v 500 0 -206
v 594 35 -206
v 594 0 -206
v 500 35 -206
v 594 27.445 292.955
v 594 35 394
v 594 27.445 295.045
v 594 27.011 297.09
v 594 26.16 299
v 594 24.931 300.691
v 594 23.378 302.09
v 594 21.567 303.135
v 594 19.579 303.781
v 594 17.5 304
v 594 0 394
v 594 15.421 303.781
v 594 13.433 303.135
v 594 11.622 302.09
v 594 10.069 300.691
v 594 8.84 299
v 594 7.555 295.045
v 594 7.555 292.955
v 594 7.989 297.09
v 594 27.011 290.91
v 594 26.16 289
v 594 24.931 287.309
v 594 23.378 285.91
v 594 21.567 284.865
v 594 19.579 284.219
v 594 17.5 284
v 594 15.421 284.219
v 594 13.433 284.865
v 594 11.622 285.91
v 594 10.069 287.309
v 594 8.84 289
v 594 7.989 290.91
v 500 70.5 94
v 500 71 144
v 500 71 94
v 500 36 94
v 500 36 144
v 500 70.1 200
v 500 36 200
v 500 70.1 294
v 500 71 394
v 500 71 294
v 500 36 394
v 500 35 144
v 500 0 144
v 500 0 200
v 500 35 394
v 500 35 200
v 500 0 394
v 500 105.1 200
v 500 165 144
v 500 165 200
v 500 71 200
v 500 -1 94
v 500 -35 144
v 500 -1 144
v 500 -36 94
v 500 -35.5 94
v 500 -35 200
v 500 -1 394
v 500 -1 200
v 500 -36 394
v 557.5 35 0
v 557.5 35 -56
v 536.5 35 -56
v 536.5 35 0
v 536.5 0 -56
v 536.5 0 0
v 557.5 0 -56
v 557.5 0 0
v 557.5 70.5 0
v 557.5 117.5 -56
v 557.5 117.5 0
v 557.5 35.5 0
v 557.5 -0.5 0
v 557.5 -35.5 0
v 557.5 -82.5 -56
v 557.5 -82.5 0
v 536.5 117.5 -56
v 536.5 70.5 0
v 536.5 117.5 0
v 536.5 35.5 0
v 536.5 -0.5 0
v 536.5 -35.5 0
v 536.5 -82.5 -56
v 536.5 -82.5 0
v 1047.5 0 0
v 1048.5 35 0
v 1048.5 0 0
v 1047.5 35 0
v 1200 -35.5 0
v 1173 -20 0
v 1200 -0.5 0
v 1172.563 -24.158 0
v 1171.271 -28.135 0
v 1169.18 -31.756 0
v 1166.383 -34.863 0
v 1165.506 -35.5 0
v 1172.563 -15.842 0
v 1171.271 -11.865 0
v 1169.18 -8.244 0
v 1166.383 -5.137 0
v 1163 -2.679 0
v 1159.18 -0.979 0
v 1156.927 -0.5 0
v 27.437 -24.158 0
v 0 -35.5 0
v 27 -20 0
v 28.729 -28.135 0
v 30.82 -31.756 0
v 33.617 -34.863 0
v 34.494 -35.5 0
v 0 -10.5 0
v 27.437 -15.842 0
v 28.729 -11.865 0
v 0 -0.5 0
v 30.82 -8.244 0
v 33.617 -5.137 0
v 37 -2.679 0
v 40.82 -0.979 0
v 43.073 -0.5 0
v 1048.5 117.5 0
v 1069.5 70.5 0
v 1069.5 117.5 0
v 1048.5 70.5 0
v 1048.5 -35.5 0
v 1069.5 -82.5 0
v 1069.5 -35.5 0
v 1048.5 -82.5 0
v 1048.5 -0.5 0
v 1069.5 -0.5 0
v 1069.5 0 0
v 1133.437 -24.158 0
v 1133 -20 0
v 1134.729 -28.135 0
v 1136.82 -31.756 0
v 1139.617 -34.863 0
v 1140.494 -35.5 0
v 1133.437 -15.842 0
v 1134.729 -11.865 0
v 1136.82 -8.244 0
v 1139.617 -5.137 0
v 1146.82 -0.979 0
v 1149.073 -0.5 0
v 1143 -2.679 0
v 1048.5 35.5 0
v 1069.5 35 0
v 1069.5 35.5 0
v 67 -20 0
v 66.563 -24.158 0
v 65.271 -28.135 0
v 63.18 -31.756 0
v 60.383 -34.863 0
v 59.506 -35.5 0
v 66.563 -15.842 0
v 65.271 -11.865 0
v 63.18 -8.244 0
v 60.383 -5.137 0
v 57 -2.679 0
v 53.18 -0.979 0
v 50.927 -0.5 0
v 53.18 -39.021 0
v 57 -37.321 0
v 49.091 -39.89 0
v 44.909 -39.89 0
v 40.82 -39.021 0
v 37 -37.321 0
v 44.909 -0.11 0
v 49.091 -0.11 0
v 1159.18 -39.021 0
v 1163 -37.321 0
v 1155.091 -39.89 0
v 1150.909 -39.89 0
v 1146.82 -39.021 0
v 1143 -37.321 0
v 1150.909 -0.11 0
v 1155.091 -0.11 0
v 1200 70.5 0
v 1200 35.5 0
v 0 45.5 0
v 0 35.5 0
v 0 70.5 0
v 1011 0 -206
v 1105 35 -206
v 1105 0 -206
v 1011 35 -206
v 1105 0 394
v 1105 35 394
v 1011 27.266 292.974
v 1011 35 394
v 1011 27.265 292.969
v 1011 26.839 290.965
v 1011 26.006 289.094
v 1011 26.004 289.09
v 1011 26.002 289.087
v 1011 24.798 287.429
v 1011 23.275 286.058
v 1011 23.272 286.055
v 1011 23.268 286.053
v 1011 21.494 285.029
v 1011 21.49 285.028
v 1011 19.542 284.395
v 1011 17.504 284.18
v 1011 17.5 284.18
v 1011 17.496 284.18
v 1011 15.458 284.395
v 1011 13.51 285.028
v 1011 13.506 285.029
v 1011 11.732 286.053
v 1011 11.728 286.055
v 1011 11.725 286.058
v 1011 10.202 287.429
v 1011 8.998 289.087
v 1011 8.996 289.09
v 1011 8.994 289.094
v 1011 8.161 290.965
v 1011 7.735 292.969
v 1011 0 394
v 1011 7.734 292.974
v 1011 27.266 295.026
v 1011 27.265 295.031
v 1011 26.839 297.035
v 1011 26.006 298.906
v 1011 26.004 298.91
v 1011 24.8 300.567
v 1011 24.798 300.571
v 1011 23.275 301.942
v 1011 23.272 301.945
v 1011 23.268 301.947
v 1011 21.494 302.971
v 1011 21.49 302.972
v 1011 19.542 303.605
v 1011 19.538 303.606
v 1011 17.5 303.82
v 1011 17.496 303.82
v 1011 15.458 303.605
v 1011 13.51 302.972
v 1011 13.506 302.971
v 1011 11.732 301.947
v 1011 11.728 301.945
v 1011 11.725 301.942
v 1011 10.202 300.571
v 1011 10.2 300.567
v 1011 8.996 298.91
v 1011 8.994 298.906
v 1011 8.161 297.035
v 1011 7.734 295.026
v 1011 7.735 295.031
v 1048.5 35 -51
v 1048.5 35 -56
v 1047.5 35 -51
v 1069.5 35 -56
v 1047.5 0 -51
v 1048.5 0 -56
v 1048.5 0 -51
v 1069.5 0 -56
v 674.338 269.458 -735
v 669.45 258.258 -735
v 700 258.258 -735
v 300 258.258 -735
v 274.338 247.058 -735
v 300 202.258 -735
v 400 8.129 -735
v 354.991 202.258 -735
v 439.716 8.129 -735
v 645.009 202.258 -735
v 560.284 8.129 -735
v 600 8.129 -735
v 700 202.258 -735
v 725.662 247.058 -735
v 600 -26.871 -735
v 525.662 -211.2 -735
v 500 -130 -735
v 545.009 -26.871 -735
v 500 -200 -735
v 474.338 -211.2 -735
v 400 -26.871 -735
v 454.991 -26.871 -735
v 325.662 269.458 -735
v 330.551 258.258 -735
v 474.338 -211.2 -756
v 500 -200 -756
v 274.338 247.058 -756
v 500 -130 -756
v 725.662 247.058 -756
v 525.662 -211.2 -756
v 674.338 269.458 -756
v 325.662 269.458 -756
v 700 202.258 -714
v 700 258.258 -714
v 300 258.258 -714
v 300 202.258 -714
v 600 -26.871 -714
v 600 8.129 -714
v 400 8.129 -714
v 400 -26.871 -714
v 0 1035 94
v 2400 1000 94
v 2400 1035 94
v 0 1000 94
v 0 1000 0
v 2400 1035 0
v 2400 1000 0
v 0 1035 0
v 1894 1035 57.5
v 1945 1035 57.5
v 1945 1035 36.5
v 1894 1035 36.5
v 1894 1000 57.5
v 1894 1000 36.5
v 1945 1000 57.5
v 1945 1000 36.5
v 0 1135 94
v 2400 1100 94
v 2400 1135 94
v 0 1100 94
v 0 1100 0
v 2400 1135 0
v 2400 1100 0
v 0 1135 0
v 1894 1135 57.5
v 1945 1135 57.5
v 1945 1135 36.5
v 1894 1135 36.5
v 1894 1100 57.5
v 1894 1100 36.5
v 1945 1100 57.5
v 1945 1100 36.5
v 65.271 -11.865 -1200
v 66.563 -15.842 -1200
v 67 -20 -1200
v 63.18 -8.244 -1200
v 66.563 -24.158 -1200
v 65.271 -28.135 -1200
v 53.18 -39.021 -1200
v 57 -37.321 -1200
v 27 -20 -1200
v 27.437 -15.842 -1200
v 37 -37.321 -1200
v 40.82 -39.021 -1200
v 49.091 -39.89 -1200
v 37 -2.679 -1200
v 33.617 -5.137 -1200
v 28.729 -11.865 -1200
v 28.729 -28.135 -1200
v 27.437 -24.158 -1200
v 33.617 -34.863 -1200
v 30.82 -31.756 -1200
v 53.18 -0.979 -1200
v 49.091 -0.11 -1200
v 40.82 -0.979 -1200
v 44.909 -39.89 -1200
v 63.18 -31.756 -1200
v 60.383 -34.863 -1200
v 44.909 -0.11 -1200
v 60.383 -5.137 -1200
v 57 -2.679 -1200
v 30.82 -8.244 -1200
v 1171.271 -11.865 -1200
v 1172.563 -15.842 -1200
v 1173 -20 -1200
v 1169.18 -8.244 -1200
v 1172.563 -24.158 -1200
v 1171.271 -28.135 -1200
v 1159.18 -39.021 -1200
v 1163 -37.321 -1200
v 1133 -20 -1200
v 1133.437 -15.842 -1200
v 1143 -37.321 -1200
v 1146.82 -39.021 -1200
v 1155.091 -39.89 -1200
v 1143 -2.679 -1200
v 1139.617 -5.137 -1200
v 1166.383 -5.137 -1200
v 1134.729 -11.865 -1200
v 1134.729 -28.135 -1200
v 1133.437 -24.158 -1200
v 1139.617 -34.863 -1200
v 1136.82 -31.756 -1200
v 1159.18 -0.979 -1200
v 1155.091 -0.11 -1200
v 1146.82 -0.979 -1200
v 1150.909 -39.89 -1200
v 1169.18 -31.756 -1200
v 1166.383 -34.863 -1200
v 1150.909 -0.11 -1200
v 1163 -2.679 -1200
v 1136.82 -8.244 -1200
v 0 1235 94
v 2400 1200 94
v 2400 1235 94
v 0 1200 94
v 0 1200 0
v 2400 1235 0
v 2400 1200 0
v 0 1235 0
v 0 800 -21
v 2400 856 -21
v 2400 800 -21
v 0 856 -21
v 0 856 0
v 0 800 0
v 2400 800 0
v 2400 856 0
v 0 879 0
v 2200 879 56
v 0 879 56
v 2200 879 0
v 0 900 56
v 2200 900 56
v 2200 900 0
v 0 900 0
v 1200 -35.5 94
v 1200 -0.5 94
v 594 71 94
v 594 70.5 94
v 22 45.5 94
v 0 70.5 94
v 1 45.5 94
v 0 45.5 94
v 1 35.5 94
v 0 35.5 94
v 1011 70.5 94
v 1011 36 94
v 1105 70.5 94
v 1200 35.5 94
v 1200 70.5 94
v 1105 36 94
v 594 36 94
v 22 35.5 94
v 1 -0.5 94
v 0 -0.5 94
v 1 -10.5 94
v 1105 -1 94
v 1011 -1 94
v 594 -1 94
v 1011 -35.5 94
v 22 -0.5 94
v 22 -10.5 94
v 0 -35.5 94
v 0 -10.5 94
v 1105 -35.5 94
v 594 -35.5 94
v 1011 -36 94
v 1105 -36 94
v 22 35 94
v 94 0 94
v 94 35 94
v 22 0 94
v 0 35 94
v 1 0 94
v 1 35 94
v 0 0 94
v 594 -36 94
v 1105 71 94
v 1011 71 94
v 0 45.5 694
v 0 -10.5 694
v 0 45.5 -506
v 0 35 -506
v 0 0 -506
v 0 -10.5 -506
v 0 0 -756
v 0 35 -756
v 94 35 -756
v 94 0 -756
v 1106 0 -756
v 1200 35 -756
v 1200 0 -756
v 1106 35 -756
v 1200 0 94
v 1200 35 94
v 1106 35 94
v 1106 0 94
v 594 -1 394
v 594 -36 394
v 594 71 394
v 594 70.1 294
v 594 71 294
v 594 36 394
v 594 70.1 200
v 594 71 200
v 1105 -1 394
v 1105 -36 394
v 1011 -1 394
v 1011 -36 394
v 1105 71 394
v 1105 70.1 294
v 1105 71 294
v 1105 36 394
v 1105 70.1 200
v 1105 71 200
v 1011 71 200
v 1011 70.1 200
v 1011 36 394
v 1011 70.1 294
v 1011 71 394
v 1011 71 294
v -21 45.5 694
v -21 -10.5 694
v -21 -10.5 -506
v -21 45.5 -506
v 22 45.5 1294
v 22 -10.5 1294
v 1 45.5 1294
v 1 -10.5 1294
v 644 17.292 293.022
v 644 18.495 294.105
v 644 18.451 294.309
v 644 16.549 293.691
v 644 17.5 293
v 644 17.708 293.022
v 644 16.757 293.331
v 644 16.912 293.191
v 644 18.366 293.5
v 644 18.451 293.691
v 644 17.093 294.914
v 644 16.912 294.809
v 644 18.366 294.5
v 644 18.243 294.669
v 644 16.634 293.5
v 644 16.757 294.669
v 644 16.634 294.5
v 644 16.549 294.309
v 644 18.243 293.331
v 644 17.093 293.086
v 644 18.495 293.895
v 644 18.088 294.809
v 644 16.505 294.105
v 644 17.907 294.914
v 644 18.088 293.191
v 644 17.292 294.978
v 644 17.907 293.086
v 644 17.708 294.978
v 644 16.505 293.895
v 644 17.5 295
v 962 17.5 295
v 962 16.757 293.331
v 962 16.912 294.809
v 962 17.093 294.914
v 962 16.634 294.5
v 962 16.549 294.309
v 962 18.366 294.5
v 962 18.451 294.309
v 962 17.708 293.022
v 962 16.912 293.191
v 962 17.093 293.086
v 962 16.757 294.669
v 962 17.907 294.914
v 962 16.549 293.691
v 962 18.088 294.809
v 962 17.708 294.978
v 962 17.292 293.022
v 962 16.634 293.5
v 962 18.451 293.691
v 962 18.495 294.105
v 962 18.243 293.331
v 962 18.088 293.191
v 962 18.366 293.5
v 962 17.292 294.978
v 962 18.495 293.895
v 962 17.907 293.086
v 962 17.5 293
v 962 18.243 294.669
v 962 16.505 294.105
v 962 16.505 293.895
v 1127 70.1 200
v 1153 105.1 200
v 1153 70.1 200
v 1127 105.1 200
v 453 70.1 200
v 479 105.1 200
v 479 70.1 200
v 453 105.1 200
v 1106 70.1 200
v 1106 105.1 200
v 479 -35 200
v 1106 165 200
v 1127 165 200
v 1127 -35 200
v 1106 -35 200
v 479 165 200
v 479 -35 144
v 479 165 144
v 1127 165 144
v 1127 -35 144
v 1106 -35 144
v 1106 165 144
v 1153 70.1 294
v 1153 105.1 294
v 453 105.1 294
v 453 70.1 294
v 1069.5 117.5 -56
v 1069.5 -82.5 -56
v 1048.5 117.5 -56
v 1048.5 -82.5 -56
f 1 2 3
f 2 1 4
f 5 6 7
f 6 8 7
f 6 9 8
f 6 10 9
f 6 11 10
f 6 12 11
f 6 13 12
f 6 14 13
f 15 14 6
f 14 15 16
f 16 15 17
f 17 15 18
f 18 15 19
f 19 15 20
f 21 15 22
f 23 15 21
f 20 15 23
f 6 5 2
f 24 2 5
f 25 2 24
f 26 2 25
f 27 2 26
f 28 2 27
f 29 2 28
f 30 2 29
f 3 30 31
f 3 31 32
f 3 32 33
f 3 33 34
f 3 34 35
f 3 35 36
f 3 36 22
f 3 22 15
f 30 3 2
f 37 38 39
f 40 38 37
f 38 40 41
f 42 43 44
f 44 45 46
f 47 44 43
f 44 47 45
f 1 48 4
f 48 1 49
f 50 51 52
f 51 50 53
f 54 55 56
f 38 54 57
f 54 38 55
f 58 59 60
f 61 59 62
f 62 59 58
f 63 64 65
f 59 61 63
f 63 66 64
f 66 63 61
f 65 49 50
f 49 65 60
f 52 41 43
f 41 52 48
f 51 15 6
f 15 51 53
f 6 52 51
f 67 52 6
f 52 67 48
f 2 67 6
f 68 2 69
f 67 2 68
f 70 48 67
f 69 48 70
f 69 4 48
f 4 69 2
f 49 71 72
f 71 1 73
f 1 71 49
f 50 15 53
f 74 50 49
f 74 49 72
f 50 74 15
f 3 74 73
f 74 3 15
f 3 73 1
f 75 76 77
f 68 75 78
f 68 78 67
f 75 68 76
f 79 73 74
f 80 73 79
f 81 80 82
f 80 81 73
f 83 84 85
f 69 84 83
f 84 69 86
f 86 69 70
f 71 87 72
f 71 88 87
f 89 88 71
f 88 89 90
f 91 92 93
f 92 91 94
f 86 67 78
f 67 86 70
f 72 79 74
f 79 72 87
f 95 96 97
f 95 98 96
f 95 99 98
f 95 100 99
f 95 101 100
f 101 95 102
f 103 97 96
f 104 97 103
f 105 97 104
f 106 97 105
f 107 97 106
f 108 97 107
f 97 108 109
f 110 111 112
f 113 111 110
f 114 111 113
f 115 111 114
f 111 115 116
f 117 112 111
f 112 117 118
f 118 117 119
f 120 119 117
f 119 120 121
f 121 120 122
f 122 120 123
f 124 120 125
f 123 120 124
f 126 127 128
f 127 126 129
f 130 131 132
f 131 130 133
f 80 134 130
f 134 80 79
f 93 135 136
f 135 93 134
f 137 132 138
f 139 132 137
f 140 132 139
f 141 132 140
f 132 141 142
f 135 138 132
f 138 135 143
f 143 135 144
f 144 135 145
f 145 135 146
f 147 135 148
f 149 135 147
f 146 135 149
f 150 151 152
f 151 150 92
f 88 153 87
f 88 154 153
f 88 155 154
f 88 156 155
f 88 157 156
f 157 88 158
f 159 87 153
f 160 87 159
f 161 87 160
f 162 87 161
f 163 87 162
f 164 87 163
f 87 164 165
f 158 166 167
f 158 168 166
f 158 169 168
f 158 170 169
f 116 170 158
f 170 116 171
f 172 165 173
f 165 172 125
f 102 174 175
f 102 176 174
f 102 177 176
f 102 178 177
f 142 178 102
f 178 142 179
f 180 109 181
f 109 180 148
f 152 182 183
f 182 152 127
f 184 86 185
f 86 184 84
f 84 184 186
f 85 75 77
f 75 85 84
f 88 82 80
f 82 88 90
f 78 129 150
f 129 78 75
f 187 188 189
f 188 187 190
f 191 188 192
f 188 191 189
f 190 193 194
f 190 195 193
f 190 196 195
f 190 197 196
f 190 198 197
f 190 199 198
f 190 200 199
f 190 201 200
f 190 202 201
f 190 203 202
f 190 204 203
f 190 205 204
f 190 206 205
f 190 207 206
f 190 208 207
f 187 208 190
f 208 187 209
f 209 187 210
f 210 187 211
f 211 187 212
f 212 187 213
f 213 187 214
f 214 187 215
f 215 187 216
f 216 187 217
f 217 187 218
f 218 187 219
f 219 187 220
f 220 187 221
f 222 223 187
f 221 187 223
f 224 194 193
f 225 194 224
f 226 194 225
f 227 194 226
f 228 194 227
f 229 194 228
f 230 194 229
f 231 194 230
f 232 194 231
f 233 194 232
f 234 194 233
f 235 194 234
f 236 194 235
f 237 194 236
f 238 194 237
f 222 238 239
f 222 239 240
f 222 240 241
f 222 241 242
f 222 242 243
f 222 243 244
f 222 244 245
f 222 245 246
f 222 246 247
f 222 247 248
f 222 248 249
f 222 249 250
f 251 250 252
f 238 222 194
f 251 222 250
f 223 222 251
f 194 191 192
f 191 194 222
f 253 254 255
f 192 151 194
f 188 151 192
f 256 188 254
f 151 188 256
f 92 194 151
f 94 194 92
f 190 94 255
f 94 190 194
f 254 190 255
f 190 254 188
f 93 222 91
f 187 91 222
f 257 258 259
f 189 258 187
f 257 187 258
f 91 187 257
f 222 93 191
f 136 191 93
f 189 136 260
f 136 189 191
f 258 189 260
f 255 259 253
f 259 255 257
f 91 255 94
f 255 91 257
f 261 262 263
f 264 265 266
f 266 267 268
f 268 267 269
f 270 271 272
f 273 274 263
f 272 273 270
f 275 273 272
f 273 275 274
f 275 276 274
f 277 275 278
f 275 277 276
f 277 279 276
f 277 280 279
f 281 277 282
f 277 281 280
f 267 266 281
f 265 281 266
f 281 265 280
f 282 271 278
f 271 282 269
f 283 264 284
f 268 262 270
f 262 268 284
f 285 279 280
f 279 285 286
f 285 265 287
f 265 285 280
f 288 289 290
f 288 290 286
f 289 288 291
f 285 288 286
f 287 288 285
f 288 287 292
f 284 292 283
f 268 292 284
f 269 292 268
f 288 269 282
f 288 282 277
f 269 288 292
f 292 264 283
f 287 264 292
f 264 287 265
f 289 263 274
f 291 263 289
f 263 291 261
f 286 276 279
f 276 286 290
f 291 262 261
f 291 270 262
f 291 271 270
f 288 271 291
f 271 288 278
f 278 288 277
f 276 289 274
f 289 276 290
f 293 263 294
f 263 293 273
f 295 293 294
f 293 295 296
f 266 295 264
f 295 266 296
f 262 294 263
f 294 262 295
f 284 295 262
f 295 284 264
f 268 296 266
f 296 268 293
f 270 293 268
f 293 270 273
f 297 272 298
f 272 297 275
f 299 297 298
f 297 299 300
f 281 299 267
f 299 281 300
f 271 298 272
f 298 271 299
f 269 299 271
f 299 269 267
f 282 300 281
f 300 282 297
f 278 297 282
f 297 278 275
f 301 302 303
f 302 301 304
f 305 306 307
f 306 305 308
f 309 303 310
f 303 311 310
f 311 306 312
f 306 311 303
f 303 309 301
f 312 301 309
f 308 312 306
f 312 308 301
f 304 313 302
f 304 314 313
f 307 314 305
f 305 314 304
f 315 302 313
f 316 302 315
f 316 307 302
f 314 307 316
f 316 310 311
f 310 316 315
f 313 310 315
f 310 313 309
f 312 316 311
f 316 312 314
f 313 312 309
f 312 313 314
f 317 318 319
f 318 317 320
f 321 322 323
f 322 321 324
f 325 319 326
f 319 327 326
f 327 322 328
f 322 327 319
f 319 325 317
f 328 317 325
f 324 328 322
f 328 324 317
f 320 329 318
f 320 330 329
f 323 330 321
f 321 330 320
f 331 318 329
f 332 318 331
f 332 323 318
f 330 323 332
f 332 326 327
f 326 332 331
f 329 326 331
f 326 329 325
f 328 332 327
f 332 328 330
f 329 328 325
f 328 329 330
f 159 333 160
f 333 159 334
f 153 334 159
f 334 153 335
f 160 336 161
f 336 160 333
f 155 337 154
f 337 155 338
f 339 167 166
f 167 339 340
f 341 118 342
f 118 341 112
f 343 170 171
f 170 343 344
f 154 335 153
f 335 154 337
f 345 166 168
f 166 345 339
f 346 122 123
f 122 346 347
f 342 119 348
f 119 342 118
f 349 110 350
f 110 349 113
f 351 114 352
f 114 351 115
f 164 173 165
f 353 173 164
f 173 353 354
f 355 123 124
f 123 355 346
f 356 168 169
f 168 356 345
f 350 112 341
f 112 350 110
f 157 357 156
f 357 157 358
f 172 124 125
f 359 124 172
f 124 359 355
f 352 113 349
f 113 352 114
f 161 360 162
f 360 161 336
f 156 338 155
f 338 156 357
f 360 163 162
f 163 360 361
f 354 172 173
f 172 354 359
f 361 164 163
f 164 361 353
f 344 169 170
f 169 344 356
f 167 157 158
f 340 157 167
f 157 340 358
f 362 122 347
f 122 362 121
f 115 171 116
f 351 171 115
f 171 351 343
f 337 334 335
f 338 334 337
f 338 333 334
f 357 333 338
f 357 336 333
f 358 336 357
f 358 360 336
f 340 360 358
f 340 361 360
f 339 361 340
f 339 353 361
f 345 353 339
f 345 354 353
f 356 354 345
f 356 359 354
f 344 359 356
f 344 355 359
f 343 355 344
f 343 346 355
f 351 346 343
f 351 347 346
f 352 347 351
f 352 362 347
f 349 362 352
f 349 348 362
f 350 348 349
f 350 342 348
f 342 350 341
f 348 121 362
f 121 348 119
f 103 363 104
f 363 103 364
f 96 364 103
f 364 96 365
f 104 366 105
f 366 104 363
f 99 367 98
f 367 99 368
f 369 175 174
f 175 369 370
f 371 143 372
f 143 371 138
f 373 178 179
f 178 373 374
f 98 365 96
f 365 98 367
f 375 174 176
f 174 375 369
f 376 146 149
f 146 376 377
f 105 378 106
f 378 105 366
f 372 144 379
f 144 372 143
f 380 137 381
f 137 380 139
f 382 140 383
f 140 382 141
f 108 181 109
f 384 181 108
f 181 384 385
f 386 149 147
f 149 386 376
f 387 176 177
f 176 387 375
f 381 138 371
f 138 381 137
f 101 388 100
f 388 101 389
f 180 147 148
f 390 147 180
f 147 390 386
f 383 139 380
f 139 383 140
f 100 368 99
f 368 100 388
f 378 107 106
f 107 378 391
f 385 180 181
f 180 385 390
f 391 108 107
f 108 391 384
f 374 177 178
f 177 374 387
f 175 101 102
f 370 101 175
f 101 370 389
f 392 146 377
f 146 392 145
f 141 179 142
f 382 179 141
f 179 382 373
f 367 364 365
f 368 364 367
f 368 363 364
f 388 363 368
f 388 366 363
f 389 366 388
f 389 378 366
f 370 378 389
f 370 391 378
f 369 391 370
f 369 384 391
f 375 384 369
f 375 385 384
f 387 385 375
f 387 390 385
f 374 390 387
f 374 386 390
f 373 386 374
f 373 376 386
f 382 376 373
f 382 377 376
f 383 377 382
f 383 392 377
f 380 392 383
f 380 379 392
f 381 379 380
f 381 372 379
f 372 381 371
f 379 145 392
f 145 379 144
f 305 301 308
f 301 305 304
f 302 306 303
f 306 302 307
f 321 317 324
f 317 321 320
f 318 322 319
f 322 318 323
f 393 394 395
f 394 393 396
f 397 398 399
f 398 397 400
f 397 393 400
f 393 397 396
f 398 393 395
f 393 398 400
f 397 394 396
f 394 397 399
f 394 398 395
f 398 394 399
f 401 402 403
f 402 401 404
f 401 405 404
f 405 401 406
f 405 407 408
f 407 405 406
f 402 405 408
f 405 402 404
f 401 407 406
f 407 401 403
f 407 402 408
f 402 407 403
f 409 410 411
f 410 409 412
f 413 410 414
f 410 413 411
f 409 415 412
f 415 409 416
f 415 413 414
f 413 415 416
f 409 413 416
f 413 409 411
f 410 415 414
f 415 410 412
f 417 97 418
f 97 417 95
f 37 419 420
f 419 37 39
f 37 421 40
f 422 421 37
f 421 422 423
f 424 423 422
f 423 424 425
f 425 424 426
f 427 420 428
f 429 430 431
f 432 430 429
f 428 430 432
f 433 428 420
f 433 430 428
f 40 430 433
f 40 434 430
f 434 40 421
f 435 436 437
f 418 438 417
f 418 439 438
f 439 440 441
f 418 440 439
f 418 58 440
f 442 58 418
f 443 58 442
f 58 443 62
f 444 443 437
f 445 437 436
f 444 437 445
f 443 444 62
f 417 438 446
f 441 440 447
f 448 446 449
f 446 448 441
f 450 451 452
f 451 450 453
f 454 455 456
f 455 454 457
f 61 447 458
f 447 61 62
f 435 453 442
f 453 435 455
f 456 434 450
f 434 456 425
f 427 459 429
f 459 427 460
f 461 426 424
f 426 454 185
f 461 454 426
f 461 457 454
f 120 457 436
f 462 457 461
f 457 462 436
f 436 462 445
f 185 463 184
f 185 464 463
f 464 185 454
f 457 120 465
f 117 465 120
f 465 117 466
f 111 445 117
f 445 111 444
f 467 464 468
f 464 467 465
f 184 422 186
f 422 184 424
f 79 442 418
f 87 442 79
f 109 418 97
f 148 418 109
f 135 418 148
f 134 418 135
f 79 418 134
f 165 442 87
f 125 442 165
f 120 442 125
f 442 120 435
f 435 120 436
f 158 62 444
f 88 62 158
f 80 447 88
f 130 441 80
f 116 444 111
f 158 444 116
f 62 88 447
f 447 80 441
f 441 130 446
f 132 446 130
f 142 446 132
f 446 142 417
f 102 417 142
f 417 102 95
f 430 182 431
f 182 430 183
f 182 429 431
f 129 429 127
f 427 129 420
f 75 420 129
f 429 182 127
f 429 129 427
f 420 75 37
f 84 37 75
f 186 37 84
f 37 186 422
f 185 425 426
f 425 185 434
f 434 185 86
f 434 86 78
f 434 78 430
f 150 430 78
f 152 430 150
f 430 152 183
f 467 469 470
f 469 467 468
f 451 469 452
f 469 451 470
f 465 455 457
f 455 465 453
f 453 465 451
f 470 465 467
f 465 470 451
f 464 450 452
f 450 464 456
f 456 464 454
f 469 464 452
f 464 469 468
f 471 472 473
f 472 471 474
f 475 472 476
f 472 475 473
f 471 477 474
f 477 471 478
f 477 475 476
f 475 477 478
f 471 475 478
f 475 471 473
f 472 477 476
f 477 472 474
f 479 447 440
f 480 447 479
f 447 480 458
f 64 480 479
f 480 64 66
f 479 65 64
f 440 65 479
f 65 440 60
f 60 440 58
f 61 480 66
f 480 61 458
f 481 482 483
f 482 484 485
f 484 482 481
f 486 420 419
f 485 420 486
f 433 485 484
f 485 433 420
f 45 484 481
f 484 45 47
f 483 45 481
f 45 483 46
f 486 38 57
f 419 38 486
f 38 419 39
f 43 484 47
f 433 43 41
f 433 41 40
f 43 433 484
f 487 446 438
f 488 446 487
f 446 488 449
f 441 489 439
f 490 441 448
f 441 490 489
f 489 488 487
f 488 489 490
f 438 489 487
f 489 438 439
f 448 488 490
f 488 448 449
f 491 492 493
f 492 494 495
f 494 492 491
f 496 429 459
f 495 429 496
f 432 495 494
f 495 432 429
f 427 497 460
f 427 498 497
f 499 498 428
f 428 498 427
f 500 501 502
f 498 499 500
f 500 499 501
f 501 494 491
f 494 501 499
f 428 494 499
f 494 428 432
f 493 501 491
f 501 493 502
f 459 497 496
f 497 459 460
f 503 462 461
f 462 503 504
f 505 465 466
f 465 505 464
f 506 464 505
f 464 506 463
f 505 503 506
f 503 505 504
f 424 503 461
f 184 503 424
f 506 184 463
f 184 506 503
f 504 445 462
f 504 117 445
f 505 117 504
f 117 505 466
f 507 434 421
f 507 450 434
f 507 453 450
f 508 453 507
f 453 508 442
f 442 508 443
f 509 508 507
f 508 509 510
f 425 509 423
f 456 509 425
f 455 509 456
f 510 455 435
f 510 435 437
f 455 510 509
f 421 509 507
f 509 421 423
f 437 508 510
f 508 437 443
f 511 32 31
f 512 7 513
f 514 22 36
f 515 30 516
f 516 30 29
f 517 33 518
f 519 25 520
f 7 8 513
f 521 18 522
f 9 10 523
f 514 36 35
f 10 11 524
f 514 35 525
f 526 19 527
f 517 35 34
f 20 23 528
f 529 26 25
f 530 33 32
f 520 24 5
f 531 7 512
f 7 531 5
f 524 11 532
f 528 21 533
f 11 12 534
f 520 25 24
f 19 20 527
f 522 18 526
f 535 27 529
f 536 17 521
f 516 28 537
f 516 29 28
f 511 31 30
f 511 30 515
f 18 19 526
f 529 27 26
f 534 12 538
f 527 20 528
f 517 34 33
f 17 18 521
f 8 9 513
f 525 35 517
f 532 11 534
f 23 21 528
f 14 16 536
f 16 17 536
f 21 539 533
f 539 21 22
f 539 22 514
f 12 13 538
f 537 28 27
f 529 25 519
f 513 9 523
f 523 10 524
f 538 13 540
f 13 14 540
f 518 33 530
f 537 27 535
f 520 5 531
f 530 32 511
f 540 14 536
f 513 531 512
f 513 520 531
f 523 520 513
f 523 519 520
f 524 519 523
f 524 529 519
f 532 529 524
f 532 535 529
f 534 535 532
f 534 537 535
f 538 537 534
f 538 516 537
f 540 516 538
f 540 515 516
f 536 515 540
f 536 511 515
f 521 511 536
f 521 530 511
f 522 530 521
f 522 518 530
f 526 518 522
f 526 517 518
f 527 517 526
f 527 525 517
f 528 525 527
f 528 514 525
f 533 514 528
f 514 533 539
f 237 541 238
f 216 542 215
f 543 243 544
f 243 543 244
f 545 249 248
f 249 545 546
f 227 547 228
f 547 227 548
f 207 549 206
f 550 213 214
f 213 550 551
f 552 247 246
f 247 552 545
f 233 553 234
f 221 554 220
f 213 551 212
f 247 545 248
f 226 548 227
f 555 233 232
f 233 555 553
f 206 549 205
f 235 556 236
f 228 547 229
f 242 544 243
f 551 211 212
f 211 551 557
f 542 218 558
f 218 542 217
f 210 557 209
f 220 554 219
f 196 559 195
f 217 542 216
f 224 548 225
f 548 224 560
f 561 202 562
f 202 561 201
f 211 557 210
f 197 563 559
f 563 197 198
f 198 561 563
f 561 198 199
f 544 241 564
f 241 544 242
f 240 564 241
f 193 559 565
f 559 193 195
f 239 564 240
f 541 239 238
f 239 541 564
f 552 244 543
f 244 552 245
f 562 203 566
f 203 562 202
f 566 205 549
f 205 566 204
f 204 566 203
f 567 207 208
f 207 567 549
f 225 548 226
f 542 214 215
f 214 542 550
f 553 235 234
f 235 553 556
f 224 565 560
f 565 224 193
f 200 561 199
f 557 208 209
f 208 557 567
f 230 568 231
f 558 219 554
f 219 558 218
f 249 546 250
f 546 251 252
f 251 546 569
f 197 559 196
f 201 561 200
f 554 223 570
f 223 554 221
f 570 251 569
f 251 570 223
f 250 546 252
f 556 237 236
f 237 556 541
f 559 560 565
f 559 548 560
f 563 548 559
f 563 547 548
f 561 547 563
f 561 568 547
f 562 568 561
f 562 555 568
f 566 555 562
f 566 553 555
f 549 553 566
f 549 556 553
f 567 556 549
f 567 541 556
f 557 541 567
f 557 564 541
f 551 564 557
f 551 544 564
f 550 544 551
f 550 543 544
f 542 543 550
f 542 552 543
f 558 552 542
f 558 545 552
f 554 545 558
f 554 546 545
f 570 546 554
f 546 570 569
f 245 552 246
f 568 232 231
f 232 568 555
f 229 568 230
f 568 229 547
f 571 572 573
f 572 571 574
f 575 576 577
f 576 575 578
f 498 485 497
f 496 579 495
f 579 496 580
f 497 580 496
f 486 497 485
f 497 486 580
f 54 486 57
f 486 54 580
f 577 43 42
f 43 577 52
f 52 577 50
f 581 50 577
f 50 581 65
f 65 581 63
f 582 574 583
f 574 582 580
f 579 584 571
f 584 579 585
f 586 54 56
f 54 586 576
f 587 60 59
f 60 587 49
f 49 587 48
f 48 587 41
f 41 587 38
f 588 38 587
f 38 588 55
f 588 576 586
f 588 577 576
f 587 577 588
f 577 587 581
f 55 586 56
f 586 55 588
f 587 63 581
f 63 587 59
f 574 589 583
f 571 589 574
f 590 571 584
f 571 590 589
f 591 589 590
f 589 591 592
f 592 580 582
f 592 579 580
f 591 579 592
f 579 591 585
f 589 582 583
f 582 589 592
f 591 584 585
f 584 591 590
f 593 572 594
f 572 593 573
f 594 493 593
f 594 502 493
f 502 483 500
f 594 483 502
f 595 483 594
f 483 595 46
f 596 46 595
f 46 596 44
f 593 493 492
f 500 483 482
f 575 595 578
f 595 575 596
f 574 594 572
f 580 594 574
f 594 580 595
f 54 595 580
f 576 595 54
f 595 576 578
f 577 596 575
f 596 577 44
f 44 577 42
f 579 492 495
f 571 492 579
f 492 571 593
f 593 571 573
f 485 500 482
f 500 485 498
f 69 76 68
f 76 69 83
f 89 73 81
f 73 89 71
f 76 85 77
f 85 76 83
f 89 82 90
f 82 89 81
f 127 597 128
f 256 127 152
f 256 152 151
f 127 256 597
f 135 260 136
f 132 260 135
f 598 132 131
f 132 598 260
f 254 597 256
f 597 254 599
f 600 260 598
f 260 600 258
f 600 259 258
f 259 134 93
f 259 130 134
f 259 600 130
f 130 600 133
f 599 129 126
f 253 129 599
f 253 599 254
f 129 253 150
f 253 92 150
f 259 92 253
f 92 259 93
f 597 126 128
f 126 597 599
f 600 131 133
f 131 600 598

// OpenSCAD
/******************************************************************************!
 * \file tour-a-perche.scad
 * \author Sebastien Beaugrand
 * \sa http://beaugrand.chez.com/
 * \copyright CeCILL 2.1 Free Software license
 ******************************************************************************/
export = false;
hc = 1050;  // Hauteur coude
L = 1200;   // Longueur gros tasseau
P = 94;     // Profondeur gros tasseau
E = 35;     // Epaisseur gros tasseau
l = 1200;   // Longueur tasseau
p = 56;     // Profondeur tasseau
e = 21;     // Epaisseur tasseau
lp = 300;   // Longueur parement
lt = 300;   // Longueur tenon
hp = 200;   // Hauteur pointes
H = hc-hp;     // Hauteur glissiere
ls = L*2-H*2;  // Longeur support
pp = L-ls;     // Position poupee
module glissiere() { cube([L,E,P]); }
color("orange") translate([0,-E-0.5,0]) glissiere();
color("green" ) translate([0, E+0.5,0]) glissiere();
module pied() { cube([H,E,P]); }
color("gray") translate([0,  0,P]) rotate([0,90,0]) pied();
color("gray") translate([L-P,0,P]) rotate([0,90,0]) pied();
module poupee() { difference() {
  cube([lp+lt,E,P]);
  translate([lt+P,-1,(P-e)/2]) cube([p-5,E+2,e]); } }
color("orangered"  ) translate([pp,     0,P+lp]) rotate([0,90,0]) poupee();
color("yellowgreen") translate([L-P*2-1,0,P+lp]) rotate([0,90,0]) poupee();
module parement() { cube([lp,E,P]); }
color("darkorange") translate([pp,     -E-1,P+lp]) rotate([0,90,0]) parement();
color("darkorange") translate([pp,      E+1,P+lp]) rotate([0,90,0]) parement();
color("darkgreen" ) translate([L-P*2-1,-E-1,P+lp]) rotate([0,90,0]) parement();
color("darkgreen" ) translate([L-P*2-1, E+1,P+lp]) rotate([0,90,0]) parement();
module perche() { cube([e,p,l]); }
color("khaki"    ) translate([-e,-p/2+E/2,-l/2+P]) perche();
color("darkkhaki") translate([1, -p/2+E/2,P     ]) perche();
module pointe() { color("gray") cylinder(50,10,1); }
translate([pp+P ,E/2,P+hp]) rotate([0, 90,0]) pointe();
translate([L-P*2,E/2,P+hp]) rotate([0,-90,0]) pointe();
module equerre() { cube([e,200,p]); }
color("violet") translate([pp-e,-E,hp-p]) equerre();
color("violet") translate([L-P ,-E,hp-p]) equerre();
module support() { cube([ls,E,P]); }
color("darkgray") translate([pp-P/2,E*2+0.1,hp]) support();
module clavette() { cube([e,200,p]); }
color("darkviolet") translate([pp +(P-e)/2,E/2-100,-p]) clavette();
color("darkviolet") translate([L-P-(P+e)/2,E/2-100,-p]) clavette();
module pedale1() { cube([500,p,e]); }
module pedale2() { cube([400,p,e]); }
module pedale3() { cube([200,35,e]); }
module pedale() { r = asin(200/500);
  rotate([0,0, r]) translate([0,-p/2,0]) pedale1();
  rotate([0,0,-r]) translate([0,-p/2,0]) pedale1();
  translate([500*cos(r)-p,200,e]) rotate([0,0,-90]) pedale2();
  translate([250*cos(r)-p,100,e]) rotate([0,0,-90]) pedale3(); }
translate([500,-200,P-H]) rotate([0,0,90]) pedale();
module piquet() { cylinder(L,20,20); }
if (! export) {
  translate([P/2,  -20,-L]) piquet();
  translate([L-P/2,-20,-L]) piquet();
  // Decoupe
  color("darkgreen"  ) translate([0,         1000,0]) parement();
  color("green"      ) translate([lp,        1000,0]) glissiere();
  color("yellowgreen") translate([lp+L,      1000,0]) poupee();
  color("darkgreen"  ) translate([lp+L+lp+lt,1000,0]) parement();
  color("darkorange" ) translate([0,         1100,0]) parement();
  color("orange"     ) translate([lp,        1100,0]) glissiere();
  color("orangered"  ) translate([lp+L,      1100,0]) poupee();
  color("darkorange" ) translate([lp+L+lp+lt,1100,0]) parement();
  color("gray"       ) translate([0,         1200,0]) pied();
  color("darkgray"   ) translate([H,         1200,0]) support();
  color("gray"       ) translate([H+700,     1200,0]) pied();
  color("khaki"      ) translate([0,    800,0]) rotate([0,90,0 ]) perche();
  color("darkkhaki"  ) translate([1200, 800,0]) rotate([0,90,0 ]) perche();
  color("violet"     ) translate([0,    900,0]) rotate([0,0,-90]) equerre();
                       translate([200,  900,0]) rotate([90,0,0 ]) pedale1();
  color("darkviolet" ) translate([700,  900,0]) rotate([0,0,-90]) clavette();
                       translate([900,  900,0]) rotate([90,0,0 ]) pedale1();
  color("violet"     ) translate([1400, 900,0]) rotate([0,0,-90]) equerre();
                       translate([1600, 900,0]) rotate([90,0,0 ]) pedale2();
  color("darkviolet" ) translate([2000, 900,0]) rotate([0,0,-90]) clavette();
}
